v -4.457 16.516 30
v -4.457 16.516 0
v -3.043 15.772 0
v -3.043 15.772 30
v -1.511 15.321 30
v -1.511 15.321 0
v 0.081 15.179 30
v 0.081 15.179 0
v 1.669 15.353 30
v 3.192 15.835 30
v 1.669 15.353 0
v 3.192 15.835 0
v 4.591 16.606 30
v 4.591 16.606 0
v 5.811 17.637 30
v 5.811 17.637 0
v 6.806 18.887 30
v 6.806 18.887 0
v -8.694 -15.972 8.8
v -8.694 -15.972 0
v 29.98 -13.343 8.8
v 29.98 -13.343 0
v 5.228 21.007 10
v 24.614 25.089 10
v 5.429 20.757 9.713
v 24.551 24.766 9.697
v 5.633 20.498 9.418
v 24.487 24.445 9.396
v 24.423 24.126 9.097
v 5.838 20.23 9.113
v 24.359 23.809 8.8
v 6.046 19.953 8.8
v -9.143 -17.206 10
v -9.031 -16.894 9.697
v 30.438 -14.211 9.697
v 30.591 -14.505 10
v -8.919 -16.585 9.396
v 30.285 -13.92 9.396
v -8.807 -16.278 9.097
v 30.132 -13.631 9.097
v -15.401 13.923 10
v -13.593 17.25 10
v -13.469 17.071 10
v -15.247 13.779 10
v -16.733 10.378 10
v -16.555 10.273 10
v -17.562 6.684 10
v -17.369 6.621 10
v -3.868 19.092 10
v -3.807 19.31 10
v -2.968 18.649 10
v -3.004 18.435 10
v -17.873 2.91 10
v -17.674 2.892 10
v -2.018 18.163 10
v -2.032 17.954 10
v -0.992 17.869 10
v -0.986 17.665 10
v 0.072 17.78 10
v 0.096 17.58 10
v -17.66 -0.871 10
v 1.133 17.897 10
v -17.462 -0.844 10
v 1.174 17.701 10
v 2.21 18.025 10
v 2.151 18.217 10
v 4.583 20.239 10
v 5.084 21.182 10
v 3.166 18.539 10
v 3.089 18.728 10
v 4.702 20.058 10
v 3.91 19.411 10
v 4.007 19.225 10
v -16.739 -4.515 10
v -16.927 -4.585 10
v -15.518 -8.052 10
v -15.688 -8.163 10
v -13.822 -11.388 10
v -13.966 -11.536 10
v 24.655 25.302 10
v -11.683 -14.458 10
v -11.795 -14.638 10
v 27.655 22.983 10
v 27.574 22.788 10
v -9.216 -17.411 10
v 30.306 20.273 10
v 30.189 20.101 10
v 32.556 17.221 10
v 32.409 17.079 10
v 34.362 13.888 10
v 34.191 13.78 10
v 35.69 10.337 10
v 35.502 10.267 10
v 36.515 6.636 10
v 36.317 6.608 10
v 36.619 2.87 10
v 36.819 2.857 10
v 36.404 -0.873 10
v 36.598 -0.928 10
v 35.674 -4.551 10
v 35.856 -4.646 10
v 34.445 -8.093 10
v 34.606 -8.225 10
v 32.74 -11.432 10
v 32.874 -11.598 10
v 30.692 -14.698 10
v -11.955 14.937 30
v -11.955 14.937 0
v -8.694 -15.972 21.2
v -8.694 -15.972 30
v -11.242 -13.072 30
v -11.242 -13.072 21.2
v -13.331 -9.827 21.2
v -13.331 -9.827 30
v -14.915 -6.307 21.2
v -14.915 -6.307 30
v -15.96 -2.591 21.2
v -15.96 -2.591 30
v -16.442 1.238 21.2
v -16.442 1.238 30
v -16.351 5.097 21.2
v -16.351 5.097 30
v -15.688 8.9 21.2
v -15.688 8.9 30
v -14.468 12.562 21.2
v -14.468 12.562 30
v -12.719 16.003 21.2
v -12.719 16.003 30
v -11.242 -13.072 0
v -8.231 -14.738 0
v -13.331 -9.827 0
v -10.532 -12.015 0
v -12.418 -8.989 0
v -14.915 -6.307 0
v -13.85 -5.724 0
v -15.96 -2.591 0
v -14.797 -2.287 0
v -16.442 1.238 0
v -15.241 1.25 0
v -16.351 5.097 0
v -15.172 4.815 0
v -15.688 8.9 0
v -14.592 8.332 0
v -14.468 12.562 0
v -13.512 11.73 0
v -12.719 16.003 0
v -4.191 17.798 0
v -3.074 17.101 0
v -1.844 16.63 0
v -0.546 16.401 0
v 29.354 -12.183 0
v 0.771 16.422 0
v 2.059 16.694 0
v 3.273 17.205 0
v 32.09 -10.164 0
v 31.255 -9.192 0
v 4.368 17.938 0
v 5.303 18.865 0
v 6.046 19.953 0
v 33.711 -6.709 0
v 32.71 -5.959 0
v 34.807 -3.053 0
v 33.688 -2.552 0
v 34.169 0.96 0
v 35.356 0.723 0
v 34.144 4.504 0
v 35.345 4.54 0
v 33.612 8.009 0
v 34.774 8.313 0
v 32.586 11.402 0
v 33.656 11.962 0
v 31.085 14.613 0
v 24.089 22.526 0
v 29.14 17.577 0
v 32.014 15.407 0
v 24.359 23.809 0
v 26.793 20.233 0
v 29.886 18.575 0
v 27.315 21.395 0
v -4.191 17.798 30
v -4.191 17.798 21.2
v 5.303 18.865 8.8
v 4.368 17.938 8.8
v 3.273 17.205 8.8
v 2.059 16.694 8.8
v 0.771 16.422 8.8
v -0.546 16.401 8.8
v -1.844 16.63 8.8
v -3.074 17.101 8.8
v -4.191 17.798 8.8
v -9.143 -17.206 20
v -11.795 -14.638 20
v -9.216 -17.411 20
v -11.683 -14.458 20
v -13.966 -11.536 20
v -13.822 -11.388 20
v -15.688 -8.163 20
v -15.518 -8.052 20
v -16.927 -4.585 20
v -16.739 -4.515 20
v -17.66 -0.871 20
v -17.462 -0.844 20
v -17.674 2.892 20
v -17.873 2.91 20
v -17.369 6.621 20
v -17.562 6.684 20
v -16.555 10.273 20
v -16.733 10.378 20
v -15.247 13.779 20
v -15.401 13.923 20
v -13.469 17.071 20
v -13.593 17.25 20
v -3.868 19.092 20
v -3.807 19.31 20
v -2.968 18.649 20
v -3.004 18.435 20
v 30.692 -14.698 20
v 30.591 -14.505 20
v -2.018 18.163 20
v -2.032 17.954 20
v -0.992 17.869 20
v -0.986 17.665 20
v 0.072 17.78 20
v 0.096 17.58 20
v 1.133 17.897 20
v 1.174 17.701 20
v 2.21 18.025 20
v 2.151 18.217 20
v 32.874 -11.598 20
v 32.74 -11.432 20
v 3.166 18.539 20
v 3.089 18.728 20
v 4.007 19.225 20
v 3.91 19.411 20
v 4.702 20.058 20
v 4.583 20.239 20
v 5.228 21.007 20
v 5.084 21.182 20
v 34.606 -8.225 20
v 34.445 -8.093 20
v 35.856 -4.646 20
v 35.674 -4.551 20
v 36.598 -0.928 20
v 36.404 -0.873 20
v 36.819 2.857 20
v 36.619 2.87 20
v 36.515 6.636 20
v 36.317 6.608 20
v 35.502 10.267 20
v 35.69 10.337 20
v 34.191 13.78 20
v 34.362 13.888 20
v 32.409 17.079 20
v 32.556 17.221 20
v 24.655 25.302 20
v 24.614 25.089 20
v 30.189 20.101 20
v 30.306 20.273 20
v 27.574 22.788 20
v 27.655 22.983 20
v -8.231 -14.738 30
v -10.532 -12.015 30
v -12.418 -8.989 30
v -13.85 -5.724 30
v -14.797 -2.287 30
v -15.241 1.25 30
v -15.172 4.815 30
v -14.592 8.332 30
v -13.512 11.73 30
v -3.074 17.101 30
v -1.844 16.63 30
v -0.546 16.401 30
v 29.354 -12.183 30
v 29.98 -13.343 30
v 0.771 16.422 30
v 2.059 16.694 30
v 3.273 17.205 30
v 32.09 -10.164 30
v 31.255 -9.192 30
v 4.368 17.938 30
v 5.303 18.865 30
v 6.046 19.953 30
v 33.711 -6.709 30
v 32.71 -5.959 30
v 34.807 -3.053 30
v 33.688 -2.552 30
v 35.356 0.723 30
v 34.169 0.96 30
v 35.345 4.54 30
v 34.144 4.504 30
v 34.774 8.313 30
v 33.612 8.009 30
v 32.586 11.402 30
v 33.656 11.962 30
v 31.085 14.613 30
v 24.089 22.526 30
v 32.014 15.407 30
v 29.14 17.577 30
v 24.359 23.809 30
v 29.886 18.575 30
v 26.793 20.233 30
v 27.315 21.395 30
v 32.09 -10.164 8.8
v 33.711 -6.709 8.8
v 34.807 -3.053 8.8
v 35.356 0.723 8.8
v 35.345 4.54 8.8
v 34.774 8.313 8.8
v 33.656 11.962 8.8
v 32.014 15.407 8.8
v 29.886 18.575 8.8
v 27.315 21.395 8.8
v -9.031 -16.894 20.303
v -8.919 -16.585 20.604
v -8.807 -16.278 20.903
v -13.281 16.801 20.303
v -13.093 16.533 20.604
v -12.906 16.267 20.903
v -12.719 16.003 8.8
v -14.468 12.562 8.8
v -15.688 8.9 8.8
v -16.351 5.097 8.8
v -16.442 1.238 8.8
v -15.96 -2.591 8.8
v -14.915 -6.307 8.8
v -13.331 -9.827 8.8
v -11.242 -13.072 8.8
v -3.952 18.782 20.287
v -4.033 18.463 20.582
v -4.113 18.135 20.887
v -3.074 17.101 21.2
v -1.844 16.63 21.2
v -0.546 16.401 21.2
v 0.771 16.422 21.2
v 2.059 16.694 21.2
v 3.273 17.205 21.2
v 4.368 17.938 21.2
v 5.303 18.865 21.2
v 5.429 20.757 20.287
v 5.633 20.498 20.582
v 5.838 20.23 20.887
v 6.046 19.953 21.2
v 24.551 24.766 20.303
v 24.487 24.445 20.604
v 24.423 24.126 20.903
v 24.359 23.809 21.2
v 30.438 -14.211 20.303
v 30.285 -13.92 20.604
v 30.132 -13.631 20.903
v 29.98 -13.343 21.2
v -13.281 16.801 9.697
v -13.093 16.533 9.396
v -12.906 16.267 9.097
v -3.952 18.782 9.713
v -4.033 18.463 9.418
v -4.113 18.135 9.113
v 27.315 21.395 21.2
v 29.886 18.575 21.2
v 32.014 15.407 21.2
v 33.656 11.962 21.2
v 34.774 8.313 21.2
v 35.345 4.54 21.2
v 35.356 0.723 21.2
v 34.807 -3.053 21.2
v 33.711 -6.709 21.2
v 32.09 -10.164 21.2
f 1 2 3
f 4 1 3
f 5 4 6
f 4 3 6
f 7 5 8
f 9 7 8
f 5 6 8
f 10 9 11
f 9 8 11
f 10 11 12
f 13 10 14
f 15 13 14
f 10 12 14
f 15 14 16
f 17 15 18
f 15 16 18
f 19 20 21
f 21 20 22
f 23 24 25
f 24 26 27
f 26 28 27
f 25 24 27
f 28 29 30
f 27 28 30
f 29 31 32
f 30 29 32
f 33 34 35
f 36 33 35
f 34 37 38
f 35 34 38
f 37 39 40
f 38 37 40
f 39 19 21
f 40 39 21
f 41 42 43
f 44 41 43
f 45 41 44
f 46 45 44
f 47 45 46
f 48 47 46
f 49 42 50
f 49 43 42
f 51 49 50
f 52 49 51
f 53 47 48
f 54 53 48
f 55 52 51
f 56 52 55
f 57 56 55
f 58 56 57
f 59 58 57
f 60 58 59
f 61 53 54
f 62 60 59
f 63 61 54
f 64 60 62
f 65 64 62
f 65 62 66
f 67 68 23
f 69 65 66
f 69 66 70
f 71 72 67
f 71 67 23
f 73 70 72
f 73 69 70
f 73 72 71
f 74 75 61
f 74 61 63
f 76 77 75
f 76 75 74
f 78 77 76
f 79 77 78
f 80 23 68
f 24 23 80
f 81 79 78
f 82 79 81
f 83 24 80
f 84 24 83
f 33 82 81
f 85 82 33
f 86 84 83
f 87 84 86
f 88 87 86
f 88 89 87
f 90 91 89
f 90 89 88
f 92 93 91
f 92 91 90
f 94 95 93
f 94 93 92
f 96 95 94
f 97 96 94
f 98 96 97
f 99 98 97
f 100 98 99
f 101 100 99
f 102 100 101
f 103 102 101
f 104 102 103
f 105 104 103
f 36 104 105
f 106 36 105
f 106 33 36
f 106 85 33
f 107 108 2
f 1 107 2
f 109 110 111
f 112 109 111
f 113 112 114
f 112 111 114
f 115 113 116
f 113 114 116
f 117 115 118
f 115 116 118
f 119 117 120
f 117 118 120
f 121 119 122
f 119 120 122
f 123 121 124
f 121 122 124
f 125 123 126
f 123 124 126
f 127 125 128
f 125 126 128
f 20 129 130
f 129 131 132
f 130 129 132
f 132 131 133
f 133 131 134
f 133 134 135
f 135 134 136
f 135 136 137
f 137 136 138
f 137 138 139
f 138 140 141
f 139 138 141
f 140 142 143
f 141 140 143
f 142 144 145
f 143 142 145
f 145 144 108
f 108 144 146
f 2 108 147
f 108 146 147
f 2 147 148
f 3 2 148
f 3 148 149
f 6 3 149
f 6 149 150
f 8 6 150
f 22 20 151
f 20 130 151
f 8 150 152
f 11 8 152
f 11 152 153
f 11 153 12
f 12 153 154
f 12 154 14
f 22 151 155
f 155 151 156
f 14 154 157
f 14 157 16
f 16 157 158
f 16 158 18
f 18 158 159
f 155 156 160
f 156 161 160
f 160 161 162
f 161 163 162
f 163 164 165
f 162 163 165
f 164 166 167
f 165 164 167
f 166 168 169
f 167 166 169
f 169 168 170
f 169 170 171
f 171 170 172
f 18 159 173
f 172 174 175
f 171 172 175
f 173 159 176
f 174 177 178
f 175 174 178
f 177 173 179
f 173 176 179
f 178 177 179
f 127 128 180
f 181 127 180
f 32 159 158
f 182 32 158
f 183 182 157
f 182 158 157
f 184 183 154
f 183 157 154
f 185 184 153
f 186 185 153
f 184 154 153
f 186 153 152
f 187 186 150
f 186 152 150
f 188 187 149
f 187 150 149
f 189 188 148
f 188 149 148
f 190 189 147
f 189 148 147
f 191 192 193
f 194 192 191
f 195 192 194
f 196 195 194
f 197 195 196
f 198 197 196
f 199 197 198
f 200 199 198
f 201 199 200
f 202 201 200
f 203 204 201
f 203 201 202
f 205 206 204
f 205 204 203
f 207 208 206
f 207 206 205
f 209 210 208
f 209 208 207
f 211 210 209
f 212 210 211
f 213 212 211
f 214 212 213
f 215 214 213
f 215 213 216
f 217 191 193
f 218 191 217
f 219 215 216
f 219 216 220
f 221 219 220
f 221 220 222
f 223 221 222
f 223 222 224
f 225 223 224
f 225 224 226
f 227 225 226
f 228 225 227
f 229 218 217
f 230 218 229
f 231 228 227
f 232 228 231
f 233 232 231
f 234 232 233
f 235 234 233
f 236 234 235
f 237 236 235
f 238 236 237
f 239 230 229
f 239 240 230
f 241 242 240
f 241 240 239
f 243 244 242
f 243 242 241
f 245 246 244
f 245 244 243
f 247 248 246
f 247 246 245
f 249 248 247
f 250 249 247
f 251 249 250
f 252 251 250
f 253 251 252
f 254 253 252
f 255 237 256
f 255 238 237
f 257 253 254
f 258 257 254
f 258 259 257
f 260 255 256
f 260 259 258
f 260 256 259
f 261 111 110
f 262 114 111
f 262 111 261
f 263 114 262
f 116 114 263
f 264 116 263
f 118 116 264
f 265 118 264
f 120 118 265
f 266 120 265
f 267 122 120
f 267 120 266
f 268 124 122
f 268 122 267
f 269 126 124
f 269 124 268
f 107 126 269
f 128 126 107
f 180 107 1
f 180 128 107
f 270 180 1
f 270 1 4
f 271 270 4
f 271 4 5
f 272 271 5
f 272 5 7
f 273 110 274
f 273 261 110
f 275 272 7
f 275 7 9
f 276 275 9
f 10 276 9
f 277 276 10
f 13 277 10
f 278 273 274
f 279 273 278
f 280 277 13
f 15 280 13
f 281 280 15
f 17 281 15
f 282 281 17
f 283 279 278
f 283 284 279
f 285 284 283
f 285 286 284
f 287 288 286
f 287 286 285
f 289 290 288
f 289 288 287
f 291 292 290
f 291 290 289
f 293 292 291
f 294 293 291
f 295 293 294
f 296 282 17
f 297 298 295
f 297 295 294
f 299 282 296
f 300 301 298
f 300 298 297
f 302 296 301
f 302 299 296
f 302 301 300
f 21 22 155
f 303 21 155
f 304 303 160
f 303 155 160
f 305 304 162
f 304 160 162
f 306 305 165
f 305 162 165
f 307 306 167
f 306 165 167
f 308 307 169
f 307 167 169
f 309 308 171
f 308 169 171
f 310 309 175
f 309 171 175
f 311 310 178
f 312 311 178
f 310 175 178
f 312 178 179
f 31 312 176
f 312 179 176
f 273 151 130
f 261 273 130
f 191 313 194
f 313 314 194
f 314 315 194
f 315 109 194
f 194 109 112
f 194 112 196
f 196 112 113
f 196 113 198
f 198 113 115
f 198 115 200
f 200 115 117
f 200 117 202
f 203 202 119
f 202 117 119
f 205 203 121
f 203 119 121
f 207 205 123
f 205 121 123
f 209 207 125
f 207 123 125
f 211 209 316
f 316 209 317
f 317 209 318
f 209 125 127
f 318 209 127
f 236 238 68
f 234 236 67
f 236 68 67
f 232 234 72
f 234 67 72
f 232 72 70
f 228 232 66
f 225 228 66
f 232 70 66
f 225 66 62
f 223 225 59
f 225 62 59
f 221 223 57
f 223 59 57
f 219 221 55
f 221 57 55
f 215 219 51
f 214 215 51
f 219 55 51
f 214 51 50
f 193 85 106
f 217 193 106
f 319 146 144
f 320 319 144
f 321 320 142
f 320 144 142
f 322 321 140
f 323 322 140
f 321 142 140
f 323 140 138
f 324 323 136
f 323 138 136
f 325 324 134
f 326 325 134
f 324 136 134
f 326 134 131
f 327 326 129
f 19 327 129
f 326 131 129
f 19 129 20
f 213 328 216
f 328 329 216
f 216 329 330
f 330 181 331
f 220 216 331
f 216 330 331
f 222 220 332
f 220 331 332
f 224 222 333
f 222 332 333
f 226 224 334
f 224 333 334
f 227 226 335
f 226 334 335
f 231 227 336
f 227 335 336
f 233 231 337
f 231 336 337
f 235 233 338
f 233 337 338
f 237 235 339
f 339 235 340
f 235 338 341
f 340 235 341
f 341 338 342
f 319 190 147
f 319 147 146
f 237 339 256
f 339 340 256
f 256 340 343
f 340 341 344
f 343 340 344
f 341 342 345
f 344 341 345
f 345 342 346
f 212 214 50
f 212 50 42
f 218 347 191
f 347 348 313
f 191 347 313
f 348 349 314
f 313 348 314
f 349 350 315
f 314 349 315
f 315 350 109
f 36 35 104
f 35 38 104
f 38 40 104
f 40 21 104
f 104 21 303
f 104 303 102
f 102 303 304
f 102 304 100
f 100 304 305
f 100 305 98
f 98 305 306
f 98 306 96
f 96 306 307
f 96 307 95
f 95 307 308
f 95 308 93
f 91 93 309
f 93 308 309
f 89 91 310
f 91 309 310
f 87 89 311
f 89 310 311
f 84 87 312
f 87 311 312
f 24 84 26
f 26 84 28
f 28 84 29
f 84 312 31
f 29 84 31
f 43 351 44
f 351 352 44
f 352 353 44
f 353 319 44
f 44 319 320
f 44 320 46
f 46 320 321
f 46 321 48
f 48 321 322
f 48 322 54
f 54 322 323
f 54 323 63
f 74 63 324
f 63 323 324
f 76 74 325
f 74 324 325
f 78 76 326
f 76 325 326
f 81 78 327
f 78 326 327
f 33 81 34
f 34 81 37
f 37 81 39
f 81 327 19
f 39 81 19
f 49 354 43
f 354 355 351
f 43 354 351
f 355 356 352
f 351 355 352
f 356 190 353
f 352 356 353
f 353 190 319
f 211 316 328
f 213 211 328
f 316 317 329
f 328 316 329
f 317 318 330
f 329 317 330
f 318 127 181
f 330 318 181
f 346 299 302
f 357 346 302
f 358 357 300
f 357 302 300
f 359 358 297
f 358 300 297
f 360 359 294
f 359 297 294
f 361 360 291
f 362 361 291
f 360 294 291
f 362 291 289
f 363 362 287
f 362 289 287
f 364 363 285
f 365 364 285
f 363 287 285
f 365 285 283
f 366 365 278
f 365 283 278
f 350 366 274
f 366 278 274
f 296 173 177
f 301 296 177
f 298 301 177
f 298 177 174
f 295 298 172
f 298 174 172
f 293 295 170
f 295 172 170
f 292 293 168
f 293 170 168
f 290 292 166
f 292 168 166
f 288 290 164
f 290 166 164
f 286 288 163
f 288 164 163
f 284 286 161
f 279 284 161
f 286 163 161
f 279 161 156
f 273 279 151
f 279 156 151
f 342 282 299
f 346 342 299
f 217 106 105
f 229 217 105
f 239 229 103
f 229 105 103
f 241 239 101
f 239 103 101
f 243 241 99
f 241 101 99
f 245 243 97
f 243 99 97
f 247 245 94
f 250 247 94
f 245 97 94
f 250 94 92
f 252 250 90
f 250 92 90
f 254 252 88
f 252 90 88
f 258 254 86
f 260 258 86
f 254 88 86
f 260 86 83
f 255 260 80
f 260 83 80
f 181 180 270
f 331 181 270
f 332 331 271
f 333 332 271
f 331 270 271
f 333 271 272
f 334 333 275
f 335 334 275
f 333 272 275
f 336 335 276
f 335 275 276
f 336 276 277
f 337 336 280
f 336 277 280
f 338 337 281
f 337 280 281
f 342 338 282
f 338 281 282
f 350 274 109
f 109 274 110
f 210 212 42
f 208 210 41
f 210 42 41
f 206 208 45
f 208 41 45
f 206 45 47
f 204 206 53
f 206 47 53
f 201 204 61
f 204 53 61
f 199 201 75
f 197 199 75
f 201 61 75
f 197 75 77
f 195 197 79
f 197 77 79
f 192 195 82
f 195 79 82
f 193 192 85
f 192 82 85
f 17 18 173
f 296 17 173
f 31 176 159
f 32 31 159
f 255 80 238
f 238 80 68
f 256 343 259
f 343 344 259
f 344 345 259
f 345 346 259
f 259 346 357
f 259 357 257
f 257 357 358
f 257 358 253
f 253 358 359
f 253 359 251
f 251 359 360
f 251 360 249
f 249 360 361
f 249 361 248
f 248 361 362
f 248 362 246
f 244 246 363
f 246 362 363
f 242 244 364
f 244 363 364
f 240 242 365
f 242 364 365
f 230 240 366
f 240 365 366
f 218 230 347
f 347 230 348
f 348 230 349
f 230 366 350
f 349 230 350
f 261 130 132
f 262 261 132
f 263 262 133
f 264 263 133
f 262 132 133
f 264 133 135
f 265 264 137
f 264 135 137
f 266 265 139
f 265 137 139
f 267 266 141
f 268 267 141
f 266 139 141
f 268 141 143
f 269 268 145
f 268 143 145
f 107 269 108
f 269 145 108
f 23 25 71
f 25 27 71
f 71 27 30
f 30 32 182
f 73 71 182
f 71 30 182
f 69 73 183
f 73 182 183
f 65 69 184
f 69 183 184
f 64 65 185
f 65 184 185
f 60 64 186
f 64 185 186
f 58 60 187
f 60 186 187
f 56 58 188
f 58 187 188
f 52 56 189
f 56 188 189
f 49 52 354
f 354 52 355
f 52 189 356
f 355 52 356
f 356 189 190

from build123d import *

# Parameters (mm, degrees)
F1_DEPTH = 30
F3_DEPTH = 10
F5_DEPTH = 10
F6_SIZE  = 1.2


with BuildPart() as f1:
    # F0 (on Top) → F1 (new body)
    with BuildSketch(Plane.XY):
        with BuildLine():
            Line((-9.216308, -17.411032), (30.691593, -14.698203))
            ThreePointArc((30.691593, -14.698203), (36.514619, 6.635995), (24.655298, 25.301797))
            Line((24.655298, 25.301797), (5.084314, 21.18153))
            ThreePointArc((5.084314, 21.18153), (1.133073, 17.897067), (-3.807032, 19.309641))
            Line((-3.807032, 19.309641), (-13.592523, 17.249507))
            ThreePointArc((-13.592523, 17.249507), (-17.660185, -0.870611), (-9.216308, -17.411032))
        make_face()
        with BuildLine():
            ThreePointArc((-8.23102, -14.738054), (-15.082961, -0.526675), (-11.955391, 14.937177))
            Line((-11.955391, 14.937177), (-4.457272, 16.515751))
            ThreePointArc((-4.457272, 16.515751), (1.668708, 15.35284), (6.805824, 18.886964))
            Line((6.805824, 18.886964), (24.089435, 22.525672))
            ThreePointArc((24.089435, 22.525672), (33.940977, 6.266214), (29.353638, -12.183153))
            Line((29.353638, -12.183153), (-8.23102, -14.738054))
        make_face(mode=Mode.SUBTRACT)
    extrude(amount=F1_DEPTH)

    # F2 (on face) → F3 (cut)
    with BuildSketch(Plane(origin=(0, 0, 0), x_dir=(1, 0, 0), z_dir=(0, 0, -1))):
        with BuildLine():
            Line((30.691593, 14.698203), (-9.216308, 17.411032))
            ThreePointArc((-9.216308, 17.411032), (-17.660185, 0.870611), (-13.592523, -17.249507))
            Line((-13.592523, -17.249507), (-3.807032, -19.309641))
            ThreePointArc((-3.807032, -19.309641), (1.133073, -17.897067), (5.084314, -21.18153))
            Line((5.084314, -21.18153), (24.655298, -25.301797))
            ThreePointArc((24.655298, -25.301797), (36.514619, -6.635995), (30.691593, 14.698203))
        make_face()
        with BuildLine():
            ThreePointArc((6.045536, -19.953206), (1.421492, -16.527099), (-4.191416, -17.798027))
            Line((-4.191416, -17.798027), (-12.719125, -16.002694))
            ThreePointArc((-12.719125, -16.002694), (-16.272457, 0.685365), (-8.694441, 15.972326))
            Line((-8.694441, 15.972326), (29.979829, 13.343356))
            ThreePointArc((29.979829, 13.343356), (35.128806, -6.436932), (24.358737, -23.808673))
            Line((24.358737, -23.808673), (6.045536, -19.953206))
        make_face(mode=Mode.SUBTRACT)
    extrude(amount=-F3_DEPTH, mode=Mode.SUBTRACT)

    # F4 (on face) → F5 (cut)
    with BuildSketch(Plane.XY.offset(30)):
        with BuildLine():
            Line((-3.807032, 19.309641), (-13.592523, 17.249507))
            ThreePointArc((-13.592523, 17.249507), (-17.660185, -0.870611), (-9.216308, -17.411032))
            Line((-9.216308, -17.411032), (30.691593, -14.698203))
            ThreePointArc((30.691593, -14.698203), (36.514619, 6.635995), (24.655298, 25.301797))
            Line((24.655298, 25.301797), (5.084314, 21.18153))
            ThreePointArc((5.084314, 21.18153), (1.133073, 17.897067), (-3.807032, 19.309641))
        make_face()
        with BuildLine():
            ThreePointArc((-8.694441, -15.972326), (-16.272457, -0.685365), (-12.719125, 16.002694))
            Line((-12.719125, 16.002694), (-4.191416, 17.798027))
            ThreePointArc((-4.191416, 17.798027), (1.421492, 16.527099), (6.045536, 19.953206))
            Line((6.045536, 19.953206), (24.358737, 23.808673))
            ThreePointArc((24.358737, 23.808673), (35.128806, 6.436932), (29.979829, -13.343356))
            Line((29.979829, -13.343356), (-8.694441, -15.972326))
        make_face(mode=Mode.SUBTRACT)
    extrude(amount=-F5_DEPTH, mode=Mode.SUBTRACT)

    # F6
    f6_edges = [f1.edges().sort_by_distance(p)[0] for p in [
        (-16.272457, -0.685365, 20),
        (-8.455271, 16.90036, 20),
        (1.421492, 16.527099, 20),
        (15.202137, 21.88094, 20),
        (35.128806, 6.436932, 20),
        (10.642694, -14.657841, 20),
        (15.202137, 21.88094, 10),
        (35.128806, 6.436932, 10),
        (1.421492, 16.527099, 10),
        (-8.455271, 16.90036, 10),
        (-16.272457, -0.685365, 10),
        (10.642694, -14.657841, 10),
    ]]
    chamfer(f6_edges, length=F6_SIZE)


solid = f1.part
